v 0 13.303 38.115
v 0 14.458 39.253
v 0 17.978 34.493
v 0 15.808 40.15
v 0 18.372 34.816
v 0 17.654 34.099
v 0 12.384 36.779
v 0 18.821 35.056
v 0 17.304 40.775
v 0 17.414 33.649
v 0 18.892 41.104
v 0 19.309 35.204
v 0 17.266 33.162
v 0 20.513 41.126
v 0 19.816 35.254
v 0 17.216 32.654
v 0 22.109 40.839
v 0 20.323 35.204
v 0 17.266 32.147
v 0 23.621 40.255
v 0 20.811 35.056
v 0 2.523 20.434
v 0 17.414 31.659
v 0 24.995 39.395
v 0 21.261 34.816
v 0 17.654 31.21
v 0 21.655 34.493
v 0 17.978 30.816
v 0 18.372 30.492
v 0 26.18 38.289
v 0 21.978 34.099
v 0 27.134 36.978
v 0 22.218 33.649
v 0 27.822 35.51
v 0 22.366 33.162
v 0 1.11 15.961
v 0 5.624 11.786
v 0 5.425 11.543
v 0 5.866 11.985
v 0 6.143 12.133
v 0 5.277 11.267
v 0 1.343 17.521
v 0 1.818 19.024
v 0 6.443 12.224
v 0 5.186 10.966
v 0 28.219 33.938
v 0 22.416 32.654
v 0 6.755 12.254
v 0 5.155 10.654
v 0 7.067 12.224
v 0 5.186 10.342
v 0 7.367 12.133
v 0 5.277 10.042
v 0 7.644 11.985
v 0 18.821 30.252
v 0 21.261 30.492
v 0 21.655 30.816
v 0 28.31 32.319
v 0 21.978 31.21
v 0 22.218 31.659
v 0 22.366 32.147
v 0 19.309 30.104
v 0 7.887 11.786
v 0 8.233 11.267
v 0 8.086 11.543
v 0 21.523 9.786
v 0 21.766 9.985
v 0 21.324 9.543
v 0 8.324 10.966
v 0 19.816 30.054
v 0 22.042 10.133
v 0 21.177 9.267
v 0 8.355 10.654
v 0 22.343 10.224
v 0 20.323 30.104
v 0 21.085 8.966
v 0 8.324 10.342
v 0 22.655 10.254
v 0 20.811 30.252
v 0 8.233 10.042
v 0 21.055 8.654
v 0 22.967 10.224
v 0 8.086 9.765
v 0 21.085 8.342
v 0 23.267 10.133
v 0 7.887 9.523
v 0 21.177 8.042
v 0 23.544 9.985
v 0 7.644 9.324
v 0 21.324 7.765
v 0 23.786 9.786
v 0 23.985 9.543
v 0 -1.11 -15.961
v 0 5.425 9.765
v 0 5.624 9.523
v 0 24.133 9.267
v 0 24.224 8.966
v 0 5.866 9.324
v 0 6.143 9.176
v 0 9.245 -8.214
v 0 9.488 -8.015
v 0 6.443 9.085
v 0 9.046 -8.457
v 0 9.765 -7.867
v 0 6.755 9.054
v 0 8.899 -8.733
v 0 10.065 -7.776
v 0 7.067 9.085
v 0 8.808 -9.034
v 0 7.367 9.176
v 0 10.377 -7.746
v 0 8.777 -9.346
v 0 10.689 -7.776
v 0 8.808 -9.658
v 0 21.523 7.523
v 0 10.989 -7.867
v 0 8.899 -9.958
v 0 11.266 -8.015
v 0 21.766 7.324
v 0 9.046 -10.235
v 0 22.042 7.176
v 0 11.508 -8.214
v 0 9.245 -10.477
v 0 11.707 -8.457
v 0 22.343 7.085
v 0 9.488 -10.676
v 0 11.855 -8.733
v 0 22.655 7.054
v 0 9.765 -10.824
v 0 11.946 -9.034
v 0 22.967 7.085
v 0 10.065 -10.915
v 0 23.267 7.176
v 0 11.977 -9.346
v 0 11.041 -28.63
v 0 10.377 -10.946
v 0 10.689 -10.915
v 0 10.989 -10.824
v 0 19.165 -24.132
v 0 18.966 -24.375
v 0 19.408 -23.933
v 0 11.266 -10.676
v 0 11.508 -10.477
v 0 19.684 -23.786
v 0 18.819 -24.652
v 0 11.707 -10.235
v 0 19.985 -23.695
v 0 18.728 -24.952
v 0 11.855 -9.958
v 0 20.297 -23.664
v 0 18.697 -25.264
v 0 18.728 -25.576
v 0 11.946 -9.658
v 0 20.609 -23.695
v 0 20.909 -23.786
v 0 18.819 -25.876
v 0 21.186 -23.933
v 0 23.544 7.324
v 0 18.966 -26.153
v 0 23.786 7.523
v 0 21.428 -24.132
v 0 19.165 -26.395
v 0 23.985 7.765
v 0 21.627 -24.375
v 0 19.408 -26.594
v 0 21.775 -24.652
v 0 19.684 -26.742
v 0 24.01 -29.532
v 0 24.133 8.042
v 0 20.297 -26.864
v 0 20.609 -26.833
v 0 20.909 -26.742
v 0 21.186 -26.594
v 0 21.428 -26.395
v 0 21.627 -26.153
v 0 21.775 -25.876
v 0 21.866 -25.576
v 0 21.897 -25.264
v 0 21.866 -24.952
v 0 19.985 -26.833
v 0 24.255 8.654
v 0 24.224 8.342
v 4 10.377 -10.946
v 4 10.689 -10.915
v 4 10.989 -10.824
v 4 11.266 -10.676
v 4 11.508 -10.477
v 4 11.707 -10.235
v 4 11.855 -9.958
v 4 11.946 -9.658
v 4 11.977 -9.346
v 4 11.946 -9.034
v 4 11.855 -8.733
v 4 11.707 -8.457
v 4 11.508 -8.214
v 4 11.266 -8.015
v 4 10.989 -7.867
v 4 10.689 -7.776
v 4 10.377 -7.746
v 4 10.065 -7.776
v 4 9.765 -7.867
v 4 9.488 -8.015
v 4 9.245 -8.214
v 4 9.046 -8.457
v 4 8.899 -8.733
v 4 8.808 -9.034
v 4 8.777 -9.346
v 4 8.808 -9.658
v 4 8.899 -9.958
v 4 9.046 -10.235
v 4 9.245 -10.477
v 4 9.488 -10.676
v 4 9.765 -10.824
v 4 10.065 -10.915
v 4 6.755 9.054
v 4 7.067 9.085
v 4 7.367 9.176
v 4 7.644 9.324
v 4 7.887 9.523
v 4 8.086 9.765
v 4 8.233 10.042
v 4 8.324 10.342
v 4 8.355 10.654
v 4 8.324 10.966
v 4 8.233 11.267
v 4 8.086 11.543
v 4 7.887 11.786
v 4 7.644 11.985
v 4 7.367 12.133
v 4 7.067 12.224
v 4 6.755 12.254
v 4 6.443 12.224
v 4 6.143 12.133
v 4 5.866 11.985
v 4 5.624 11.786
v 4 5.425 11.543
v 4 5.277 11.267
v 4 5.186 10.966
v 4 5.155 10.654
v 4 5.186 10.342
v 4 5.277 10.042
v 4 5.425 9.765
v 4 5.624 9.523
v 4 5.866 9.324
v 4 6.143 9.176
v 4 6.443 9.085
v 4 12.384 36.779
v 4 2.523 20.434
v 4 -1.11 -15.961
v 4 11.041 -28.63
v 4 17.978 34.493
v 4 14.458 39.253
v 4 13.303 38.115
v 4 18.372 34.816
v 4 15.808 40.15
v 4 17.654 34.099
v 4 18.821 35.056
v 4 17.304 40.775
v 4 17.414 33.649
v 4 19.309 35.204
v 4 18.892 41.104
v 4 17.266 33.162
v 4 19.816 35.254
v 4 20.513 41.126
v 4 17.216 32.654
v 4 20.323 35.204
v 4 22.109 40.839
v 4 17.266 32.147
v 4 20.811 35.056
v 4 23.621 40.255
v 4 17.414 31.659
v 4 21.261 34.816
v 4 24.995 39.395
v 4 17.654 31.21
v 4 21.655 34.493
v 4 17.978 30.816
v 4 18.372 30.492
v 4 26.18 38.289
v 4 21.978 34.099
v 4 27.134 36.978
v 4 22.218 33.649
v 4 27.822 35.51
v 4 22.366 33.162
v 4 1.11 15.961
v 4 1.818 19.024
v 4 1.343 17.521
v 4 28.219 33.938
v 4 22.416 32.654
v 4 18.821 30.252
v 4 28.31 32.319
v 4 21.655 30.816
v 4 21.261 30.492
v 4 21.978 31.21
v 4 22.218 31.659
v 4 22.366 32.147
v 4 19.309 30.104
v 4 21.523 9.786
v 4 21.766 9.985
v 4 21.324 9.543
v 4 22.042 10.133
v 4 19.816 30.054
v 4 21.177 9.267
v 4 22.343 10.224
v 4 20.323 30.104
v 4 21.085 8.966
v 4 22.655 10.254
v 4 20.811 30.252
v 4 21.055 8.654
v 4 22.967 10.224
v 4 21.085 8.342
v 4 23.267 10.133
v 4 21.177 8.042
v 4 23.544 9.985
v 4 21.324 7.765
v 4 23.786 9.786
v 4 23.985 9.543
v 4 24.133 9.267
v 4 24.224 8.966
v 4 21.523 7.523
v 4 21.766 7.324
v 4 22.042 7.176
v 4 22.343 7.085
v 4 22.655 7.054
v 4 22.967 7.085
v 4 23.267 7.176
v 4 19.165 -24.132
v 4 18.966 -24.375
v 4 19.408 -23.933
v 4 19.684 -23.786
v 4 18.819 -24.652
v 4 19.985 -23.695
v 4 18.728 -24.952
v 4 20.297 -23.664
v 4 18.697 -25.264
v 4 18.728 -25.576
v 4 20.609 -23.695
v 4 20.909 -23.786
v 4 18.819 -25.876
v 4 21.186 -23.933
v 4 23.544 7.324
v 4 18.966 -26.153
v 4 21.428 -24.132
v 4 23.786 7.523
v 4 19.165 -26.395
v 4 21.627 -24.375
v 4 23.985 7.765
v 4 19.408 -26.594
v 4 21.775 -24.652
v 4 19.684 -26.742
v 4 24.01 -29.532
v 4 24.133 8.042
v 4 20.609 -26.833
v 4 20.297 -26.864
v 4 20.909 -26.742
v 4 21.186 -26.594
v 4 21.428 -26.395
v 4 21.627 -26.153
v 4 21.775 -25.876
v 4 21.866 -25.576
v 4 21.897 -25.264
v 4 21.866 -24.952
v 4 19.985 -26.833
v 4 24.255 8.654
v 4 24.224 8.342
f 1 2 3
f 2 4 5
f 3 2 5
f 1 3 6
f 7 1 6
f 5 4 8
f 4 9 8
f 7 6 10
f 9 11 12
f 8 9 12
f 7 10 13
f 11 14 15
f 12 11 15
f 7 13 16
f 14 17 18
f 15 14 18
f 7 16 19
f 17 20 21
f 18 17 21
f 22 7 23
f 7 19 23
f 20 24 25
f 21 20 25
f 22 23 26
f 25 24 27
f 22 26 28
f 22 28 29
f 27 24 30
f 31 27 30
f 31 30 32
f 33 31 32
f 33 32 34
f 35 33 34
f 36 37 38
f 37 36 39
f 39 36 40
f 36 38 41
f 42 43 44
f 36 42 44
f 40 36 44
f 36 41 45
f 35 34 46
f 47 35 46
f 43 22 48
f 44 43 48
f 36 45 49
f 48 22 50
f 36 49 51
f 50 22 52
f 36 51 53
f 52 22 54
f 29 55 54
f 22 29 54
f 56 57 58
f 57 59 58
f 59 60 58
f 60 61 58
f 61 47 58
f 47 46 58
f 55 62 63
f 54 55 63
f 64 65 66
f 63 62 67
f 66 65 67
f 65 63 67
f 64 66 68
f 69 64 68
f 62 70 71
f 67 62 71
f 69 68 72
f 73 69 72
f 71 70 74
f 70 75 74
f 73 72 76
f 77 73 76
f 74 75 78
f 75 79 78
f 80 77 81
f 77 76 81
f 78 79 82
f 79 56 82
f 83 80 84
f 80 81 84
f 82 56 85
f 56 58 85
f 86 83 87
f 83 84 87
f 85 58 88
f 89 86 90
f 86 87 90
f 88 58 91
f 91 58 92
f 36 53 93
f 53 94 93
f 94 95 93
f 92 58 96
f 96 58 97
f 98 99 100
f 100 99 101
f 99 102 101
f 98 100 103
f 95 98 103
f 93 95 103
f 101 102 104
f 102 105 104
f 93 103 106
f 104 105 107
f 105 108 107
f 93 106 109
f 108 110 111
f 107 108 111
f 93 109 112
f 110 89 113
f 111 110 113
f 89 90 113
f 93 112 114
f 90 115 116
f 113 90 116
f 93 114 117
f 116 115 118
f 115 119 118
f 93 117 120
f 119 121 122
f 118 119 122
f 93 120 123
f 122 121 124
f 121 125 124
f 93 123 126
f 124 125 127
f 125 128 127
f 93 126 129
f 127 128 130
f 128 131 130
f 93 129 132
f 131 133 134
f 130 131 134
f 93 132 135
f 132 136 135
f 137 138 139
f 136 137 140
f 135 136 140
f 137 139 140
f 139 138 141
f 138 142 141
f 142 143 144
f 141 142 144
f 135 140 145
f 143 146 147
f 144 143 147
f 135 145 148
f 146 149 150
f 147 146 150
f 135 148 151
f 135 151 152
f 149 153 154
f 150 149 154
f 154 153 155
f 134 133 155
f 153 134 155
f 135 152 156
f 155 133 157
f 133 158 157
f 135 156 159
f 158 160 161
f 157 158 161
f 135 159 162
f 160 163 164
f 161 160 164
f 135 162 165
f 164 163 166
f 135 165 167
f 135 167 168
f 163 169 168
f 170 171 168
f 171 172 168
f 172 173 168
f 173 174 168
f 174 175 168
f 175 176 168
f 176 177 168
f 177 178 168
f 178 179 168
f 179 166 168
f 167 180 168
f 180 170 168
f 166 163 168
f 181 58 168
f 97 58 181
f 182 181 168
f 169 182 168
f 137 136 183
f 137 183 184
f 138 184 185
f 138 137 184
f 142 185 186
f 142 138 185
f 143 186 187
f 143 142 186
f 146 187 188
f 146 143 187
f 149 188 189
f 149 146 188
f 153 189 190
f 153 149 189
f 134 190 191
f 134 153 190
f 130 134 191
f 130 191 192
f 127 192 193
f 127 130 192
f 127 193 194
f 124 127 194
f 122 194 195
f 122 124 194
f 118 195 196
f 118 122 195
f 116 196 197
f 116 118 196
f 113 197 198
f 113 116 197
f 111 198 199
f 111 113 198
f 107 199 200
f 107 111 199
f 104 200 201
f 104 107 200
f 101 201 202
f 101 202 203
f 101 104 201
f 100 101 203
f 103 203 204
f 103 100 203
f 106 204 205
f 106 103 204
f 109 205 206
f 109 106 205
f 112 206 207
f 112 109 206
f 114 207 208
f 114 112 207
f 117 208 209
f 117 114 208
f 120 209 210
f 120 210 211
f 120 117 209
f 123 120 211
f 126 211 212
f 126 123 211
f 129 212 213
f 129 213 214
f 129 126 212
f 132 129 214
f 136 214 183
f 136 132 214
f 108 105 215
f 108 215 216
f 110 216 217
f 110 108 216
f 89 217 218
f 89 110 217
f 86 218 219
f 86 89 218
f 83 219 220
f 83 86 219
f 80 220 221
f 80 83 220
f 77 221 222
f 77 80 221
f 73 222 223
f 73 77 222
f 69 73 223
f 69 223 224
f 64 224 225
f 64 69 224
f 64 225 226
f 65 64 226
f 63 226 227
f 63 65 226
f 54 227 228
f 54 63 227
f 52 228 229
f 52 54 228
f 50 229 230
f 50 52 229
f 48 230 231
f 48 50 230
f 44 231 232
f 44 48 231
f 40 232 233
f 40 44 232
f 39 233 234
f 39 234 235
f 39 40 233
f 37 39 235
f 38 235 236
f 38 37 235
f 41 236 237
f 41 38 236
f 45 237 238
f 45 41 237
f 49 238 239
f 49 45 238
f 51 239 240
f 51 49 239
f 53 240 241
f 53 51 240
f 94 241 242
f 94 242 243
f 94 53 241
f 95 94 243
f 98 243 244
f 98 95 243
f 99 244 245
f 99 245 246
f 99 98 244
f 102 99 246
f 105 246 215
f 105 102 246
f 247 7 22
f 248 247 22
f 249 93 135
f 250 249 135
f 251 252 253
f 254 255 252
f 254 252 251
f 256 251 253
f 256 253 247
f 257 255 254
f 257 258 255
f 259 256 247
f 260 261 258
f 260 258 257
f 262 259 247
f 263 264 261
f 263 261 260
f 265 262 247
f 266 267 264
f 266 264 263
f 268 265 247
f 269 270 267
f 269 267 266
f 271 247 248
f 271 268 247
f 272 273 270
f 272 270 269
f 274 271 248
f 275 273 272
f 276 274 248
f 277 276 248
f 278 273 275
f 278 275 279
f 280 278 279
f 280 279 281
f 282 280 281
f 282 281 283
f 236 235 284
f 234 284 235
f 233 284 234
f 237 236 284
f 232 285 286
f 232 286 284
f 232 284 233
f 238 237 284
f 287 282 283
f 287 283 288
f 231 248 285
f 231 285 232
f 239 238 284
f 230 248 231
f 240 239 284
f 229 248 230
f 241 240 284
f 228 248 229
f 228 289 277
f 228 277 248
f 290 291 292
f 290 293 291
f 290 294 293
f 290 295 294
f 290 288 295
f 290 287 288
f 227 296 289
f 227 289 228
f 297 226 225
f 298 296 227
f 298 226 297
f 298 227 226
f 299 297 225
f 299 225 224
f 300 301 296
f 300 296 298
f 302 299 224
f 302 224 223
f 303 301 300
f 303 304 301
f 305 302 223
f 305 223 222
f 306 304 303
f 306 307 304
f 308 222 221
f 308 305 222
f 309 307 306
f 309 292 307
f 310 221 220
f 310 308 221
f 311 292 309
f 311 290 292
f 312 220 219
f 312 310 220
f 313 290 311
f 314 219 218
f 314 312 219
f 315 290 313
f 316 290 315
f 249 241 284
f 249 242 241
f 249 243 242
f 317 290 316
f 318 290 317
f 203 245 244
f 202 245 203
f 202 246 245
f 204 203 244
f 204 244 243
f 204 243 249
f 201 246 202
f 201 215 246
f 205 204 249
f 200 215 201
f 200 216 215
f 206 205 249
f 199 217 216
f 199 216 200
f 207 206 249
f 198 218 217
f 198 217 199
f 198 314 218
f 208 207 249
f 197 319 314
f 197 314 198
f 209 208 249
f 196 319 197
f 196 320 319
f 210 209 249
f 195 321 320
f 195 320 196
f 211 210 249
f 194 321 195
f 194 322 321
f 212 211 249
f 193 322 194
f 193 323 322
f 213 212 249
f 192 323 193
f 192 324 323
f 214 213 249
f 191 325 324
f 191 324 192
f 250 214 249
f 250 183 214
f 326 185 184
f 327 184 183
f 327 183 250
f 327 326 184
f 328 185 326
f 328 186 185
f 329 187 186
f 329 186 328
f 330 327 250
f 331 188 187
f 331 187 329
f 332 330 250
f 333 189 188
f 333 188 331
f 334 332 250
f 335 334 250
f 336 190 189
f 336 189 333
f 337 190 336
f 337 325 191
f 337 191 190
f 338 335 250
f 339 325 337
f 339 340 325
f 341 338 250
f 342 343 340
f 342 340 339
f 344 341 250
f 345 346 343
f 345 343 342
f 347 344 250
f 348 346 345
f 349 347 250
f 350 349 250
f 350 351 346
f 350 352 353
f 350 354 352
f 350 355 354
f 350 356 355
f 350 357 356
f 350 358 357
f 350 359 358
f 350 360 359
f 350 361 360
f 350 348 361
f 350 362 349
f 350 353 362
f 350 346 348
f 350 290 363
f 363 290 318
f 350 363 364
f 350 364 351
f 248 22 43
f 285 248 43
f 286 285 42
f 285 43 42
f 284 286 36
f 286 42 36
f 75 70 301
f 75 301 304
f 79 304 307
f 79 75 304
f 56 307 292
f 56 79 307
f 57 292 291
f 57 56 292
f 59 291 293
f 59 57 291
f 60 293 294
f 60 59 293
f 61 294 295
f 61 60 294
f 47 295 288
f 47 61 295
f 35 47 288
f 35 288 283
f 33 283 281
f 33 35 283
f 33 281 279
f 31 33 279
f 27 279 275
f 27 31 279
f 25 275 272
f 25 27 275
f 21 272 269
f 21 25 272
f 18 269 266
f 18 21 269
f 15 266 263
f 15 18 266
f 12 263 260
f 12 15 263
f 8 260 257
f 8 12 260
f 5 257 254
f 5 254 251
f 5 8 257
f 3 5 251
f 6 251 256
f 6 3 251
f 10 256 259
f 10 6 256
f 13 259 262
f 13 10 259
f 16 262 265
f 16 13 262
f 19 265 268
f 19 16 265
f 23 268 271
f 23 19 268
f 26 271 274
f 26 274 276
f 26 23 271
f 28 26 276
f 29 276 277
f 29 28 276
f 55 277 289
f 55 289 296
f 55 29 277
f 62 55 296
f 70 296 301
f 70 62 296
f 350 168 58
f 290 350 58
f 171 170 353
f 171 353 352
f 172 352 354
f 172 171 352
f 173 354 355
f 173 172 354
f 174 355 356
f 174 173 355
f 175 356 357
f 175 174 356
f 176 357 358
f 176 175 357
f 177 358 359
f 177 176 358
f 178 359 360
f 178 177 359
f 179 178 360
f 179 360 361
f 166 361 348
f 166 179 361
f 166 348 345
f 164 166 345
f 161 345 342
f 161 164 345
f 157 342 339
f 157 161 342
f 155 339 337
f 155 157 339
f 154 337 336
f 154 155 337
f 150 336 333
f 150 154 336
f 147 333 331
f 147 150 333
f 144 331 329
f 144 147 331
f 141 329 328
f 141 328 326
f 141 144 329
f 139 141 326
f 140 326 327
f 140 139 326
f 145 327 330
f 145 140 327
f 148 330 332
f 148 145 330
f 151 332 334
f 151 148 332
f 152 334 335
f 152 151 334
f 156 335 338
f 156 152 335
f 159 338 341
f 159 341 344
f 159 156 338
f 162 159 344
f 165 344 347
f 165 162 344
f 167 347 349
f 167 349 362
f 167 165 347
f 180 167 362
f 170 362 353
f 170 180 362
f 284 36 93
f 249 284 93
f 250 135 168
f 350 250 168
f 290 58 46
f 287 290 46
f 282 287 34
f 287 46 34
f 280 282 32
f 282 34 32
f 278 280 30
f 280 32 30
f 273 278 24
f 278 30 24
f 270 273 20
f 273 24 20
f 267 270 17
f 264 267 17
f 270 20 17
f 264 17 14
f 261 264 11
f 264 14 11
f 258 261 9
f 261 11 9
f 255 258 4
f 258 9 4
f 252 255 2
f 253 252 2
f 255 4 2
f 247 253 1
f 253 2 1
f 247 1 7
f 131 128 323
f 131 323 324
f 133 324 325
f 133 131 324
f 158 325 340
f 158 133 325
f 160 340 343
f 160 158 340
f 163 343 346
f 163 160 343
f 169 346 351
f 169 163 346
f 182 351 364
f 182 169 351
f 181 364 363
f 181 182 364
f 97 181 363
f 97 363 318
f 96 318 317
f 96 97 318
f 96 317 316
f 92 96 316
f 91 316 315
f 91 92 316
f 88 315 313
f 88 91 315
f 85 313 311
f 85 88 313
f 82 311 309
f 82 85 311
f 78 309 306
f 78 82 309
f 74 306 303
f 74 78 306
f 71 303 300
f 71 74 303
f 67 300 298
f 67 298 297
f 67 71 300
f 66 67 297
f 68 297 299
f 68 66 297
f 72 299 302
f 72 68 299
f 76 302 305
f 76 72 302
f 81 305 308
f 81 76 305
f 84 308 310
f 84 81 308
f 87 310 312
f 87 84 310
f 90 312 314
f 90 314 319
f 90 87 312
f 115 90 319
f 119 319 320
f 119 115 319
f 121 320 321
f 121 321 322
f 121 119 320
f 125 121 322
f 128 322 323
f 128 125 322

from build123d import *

# Parameters (mm, degrees)
SKETCH_1_R      = 1.6
SKETCH_1_R_2    = 2.6
EXTRUDE_1_DEPTH = 4


with BuildPart() as part:
    # 草图1 → 凸台-拉伸1 (new body)
    with BuildSketch(Plane(origin=(0, 0, 0), x_dir=(0, 0, -1), z_dir=(1, 0, 0))):
        with BuildLine():
            Line((15.96147647, -1.109625561), (28.630049258, 11.041044095))
            Line((28.630049258, 11.041044095), (29.531620026, 24.009743728))
            Line((29.531620026, 24.009743728), (-32.319101296, 28.309542775))
            ThreePointArc((-32.319101296, 28.309542775), (-40.839313336, 22.108629409), (-36.779478782, 12.384274255))
            Line((-36.779478782, 12.384274255), (-20.433580884, 2.523050705))
            ThreePointArc((-20.433580884, 2.523050705), (-18.281565047, 1.550445439), (-15.96147647, 1.109625561))
            Line((-15.96147647, 1.109625561), (15.96147647, -1.109625561))
        make_face()
        with Locations((25.263844519, 20.296781)):
            Circle(SKETCH_1_R, mode=Mode.SUBTRACT)
        with Locations((-8.654292981, 22.654735317)):
            Circle(SKETCH_1_R, mode=Mode.SUBTRACT)
        with Locations((9.345707019, 10.376844831)):
            Circle(SKETCH_1_R, mode=Mode.SUBTRACT)
        with Locations((-10.654292981, 6.755156769)):
            Circle(SKETCH_1_R, mode=Mode.SUBTRACT)
        with Locations((-32.654292981, 19.816154374)):
            Circle(SKETCH_1_R_2, mode=Mode.SUBTRACT)
    extrude(amount=EXTRUDE_1_DEPTH)


solid = part.part
